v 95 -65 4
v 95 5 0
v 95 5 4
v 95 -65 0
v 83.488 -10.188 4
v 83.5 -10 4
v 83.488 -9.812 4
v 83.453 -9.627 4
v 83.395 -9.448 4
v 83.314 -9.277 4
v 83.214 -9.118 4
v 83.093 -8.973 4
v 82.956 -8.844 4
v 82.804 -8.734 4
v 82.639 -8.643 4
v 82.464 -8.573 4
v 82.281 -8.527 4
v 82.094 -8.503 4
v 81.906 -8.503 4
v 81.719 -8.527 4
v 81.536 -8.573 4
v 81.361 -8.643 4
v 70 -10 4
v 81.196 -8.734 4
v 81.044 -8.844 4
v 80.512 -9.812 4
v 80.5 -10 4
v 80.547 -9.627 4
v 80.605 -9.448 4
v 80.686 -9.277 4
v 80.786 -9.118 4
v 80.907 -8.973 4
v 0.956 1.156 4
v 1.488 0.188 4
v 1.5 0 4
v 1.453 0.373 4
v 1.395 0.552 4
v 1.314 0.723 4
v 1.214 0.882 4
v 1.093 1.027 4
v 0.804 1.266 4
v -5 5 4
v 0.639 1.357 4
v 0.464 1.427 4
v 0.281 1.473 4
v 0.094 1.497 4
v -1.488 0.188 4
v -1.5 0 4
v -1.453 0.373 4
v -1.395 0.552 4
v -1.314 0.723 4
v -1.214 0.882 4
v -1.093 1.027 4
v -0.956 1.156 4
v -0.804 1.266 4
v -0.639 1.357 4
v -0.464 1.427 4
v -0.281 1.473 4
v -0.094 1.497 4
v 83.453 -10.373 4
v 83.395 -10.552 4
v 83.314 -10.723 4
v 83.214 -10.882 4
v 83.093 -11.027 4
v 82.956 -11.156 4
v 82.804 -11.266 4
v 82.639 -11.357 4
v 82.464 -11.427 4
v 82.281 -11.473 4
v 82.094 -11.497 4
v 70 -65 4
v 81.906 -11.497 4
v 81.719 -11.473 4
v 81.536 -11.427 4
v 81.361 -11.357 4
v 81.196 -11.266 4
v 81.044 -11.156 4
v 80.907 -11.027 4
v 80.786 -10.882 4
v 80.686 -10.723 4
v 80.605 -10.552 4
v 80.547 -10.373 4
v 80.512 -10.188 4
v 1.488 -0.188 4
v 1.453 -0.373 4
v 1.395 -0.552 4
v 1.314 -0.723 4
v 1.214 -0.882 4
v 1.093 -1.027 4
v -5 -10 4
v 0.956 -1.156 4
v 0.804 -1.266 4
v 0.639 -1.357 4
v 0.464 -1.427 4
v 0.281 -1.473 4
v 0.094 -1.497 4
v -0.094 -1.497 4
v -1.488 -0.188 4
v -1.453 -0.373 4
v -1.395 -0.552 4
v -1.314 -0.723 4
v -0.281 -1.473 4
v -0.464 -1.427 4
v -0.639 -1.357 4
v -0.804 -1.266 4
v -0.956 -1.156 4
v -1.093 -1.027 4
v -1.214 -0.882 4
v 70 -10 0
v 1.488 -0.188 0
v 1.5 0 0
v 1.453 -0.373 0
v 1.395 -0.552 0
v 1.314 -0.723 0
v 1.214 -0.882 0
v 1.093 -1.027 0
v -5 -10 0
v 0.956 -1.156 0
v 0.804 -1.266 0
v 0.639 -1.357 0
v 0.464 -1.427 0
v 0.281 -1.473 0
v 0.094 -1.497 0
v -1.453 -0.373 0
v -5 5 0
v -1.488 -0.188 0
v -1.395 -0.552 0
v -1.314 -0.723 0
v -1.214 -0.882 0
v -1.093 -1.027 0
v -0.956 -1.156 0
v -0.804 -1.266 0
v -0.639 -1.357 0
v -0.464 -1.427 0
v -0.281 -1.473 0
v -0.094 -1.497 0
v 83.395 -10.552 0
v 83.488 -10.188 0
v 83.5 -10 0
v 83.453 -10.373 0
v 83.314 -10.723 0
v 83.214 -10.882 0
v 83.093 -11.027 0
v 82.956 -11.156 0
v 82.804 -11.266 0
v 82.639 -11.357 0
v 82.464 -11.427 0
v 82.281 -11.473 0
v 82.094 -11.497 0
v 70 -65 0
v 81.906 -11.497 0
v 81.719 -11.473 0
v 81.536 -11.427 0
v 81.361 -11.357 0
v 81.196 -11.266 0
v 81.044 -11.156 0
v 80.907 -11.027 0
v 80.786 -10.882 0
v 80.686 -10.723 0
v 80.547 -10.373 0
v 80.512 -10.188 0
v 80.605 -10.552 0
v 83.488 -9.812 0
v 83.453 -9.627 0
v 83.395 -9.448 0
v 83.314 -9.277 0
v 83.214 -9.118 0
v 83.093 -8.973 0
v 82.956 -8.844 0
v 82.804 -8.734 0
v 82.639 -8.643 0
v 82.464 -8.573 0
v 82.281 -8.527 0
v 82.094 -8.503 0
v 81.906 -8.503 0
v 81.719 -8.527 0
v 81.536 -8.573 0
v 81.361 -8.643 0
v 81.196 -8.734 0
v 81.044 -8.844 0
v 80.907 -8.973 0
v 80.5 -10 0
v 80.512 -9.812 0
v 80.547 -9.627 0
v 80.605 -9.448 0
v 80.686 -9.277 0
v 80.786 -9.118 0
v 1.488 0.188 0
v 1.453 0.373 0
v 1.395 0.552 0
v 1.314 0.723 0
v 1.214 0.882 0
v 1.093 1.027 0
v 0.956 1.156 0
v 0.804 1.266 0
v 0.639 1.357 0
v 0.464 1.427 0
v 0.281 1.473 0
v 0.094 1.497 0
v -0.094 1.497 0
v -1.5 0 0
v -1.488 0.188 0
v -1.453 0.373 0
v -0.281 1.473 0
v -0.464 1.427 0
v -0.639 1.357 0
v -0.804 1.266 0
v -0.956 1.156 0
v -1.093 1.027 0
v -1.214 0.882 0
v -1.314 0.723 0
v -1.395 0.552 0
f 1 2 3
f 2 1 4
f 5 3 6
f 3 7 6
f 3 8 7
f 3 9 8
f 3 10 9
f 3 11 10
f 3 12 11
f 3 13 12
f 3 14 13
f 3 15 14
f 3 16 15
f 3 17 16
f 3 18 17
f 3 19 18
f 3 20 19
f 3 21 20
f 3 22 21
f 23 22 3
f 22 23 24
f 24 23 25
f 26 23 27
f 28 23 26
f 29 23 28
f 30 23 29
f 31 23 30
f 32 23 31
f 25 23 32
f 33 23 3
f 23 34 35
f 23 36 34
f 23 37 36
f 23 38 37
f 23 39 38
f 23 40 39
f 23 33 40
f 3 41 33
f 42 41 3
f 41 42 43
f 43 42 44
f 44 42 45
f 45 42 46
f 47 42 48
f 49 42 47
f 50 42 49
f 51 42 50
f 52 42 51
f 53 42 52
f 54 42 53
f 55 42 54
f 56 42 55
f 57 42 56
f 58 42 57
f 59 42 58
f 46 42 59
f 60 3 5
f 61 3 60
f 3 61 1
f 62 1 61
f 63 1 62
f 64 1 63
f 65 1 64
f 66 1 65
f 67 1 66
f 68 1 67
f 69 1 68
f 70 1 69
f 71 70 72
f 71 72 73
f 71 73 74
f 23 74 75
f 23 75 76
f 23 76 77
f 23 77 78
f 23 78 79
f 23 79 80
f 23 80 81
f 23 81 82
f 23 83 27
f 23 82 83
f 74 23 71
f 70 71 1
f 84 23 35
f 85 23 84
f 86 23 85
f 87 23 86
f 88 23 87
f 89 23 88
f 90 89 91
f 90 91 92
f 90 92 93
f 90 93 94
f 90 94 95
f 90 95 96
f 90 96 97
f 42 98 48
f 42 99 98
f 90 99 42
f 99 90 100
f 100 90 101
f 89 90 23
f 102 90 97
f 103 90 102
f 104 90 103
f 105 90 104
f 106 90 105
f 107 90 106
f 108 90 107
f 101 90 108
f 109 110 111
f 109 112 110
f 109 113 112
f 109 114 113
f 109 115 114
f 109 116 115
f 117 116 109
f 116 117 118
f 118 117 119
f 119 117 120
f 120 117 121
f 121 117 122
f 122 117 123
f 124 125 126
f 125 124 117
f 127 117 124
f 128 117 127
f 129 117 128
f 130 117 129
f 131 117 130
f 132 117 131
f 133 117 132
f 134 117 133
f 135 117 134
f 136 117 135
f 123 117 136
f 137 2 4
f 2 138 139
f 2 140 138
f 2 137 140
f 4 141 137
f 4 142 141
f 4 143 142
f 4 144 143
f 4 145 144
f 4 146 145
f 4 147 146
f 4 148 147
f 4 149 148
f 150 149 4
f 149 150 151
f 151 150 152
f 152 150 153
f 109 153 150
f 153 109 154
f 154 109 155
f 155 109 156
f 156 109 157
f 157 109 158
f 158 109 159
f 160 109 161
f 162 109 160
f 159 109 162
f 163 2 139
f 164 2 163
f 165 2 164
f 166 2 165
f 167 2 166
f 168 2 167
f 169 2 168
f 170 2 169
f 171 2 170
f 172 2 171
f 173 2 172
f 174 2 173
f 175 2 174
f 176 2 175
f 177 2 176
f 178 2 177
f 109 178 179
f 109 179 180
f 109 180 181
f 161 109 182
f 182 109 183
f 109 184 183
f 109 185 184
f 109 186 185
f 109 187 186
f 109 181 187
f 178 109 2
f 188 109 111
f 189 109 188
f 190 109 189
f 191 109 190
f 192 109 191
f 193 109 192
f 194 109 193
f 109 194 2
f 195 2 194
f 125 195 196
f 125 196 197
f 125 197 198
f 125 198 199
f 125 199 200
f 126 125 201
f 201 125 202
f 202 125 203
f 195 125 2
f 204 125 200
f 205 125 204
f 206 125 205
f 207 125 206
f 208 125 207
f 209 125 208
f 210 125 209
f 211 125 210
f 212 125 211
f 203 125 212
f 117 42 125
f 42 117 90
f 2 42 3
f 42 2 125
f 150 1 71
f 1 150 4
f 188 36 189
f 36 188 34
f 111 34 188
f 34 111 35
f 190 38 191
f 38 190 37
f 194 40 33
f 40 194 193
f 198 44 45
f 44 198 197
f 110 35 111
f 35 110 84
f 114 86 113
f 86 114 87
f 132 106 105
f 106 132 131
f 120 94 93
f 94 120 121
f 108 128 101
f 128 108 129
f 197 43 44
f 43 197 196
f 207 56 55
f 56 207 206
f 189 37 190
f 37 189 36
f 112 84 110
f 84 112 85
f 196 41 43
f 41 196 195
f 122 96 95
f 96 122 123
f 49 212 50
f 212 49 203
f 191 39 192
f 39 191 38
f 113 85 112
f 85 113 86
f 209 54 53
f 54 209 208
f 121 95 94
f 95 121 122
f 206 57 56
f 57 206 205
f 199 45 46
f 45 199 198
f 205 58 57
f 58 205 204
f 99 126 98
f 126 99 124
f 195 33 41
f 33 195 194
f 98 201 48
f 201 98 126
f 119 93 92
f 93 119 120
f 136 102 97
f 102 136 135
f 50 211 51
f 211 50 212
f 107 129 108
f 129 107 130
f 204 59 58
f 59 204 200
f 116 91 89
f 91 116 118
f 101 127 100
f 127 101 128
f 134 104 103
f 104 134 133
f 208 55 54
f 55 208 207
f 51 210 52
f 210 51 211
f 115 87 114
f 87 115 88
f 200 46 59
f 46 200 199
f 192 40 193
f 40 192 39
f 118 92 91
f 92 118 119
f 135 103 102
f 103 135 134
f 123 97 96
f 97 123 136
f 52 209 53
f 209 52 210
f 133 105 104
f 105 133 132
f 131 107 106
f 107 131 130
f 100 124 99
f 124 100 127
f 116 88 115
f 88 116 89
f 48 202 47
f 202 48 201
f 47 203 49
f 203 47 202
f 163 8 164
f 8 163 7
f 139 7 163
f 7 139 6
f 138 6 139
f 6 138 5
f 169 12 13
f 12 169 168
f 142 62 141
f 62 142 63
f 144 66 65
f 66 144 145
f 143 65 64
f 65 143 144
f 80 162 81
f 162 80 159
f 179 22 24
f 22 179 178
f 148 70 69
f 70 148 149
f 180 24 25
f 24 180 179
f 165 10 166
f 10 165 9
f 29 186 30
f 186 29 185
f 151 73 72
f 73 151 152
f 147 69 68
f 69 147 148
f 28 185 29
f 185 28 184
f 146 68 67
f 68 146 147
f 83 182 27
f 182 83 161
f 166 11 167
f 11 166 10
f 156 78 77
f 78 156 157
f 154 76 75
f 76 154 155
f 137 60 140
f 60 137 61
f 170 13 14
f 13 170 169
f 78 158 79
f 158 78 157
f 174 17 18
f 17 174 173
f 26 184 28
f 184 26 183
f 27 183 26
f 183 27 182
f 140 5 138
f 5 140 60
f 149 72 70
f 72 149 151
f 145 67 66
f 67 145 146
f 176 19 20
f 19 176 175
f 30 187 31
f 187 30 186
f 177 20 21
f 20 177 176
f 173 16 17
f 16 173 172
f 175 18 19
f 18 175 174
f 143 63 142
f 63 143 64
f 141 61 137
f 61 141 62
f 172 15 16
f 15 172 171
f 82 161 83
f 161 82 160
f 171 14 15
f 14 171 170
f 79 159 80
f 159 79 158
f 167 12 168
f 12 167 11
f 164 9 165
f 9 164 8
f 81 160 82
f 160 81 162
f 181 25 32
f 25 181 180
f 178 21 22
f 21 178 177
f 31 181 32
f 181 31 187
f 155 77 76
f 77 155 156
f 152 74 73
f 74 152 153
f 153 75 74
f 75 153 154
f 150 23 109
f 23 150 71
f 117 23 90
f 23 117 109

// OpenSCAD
// file: holes.scad
module DmmBolt(posX,posY,D)
  { 
   $fn=50;   
    translate([posX,posY,-1]) 
    {  
      cylinder(h=20,r=D);  
    }   
  }
  
  
 module DmmBoltHor(posX,posY,D)
  { 
   $fn=50;   
   rotate([90,0,0])
    {
    translate([posX,posY,-7]) 
    {  
      cylinder(h=20,r=D);  
    }  
   } 
  }
   
  

module DmmBoltAndScrewHole(posX,posY,D)
  { 
   $fn=50;   
    translate([posX,posY,0]) 
    { cylinder(h=2,r=D+1.5); }   
    translate([posX,posY,-1]) 
    { cylinder(h=10,r=D); }   
  }
  

module removeRectangle(posX,posY,sizX,sizY)
  {  
    translate([posX,posY,-1]) 
    {  
      cube([sizX, sizY, 10]);
    }   
  }
 
// main file
use <holes.scad>;

thickness=4; //4mm thickness of part



module landingGearPlusCosmetics()
{
  translate([ -5,-65,0]) 
       { 
        cube([100, 70, thickness]); 
       } 
}



module landingGear()
{
  //THIS FILE IS UNDER CONSTRUCTION..!  
  difference()
   {     
    landingGearPlusCosmetics();
    DmmBolt(0,0,1.5);     
    DmmBolt(82,-10,1.5);     
      translate([ -10,-70,-1]) 
       { 
        cube([80, 60, thickness+2]); 
       }    
   }
}

landingGear();
